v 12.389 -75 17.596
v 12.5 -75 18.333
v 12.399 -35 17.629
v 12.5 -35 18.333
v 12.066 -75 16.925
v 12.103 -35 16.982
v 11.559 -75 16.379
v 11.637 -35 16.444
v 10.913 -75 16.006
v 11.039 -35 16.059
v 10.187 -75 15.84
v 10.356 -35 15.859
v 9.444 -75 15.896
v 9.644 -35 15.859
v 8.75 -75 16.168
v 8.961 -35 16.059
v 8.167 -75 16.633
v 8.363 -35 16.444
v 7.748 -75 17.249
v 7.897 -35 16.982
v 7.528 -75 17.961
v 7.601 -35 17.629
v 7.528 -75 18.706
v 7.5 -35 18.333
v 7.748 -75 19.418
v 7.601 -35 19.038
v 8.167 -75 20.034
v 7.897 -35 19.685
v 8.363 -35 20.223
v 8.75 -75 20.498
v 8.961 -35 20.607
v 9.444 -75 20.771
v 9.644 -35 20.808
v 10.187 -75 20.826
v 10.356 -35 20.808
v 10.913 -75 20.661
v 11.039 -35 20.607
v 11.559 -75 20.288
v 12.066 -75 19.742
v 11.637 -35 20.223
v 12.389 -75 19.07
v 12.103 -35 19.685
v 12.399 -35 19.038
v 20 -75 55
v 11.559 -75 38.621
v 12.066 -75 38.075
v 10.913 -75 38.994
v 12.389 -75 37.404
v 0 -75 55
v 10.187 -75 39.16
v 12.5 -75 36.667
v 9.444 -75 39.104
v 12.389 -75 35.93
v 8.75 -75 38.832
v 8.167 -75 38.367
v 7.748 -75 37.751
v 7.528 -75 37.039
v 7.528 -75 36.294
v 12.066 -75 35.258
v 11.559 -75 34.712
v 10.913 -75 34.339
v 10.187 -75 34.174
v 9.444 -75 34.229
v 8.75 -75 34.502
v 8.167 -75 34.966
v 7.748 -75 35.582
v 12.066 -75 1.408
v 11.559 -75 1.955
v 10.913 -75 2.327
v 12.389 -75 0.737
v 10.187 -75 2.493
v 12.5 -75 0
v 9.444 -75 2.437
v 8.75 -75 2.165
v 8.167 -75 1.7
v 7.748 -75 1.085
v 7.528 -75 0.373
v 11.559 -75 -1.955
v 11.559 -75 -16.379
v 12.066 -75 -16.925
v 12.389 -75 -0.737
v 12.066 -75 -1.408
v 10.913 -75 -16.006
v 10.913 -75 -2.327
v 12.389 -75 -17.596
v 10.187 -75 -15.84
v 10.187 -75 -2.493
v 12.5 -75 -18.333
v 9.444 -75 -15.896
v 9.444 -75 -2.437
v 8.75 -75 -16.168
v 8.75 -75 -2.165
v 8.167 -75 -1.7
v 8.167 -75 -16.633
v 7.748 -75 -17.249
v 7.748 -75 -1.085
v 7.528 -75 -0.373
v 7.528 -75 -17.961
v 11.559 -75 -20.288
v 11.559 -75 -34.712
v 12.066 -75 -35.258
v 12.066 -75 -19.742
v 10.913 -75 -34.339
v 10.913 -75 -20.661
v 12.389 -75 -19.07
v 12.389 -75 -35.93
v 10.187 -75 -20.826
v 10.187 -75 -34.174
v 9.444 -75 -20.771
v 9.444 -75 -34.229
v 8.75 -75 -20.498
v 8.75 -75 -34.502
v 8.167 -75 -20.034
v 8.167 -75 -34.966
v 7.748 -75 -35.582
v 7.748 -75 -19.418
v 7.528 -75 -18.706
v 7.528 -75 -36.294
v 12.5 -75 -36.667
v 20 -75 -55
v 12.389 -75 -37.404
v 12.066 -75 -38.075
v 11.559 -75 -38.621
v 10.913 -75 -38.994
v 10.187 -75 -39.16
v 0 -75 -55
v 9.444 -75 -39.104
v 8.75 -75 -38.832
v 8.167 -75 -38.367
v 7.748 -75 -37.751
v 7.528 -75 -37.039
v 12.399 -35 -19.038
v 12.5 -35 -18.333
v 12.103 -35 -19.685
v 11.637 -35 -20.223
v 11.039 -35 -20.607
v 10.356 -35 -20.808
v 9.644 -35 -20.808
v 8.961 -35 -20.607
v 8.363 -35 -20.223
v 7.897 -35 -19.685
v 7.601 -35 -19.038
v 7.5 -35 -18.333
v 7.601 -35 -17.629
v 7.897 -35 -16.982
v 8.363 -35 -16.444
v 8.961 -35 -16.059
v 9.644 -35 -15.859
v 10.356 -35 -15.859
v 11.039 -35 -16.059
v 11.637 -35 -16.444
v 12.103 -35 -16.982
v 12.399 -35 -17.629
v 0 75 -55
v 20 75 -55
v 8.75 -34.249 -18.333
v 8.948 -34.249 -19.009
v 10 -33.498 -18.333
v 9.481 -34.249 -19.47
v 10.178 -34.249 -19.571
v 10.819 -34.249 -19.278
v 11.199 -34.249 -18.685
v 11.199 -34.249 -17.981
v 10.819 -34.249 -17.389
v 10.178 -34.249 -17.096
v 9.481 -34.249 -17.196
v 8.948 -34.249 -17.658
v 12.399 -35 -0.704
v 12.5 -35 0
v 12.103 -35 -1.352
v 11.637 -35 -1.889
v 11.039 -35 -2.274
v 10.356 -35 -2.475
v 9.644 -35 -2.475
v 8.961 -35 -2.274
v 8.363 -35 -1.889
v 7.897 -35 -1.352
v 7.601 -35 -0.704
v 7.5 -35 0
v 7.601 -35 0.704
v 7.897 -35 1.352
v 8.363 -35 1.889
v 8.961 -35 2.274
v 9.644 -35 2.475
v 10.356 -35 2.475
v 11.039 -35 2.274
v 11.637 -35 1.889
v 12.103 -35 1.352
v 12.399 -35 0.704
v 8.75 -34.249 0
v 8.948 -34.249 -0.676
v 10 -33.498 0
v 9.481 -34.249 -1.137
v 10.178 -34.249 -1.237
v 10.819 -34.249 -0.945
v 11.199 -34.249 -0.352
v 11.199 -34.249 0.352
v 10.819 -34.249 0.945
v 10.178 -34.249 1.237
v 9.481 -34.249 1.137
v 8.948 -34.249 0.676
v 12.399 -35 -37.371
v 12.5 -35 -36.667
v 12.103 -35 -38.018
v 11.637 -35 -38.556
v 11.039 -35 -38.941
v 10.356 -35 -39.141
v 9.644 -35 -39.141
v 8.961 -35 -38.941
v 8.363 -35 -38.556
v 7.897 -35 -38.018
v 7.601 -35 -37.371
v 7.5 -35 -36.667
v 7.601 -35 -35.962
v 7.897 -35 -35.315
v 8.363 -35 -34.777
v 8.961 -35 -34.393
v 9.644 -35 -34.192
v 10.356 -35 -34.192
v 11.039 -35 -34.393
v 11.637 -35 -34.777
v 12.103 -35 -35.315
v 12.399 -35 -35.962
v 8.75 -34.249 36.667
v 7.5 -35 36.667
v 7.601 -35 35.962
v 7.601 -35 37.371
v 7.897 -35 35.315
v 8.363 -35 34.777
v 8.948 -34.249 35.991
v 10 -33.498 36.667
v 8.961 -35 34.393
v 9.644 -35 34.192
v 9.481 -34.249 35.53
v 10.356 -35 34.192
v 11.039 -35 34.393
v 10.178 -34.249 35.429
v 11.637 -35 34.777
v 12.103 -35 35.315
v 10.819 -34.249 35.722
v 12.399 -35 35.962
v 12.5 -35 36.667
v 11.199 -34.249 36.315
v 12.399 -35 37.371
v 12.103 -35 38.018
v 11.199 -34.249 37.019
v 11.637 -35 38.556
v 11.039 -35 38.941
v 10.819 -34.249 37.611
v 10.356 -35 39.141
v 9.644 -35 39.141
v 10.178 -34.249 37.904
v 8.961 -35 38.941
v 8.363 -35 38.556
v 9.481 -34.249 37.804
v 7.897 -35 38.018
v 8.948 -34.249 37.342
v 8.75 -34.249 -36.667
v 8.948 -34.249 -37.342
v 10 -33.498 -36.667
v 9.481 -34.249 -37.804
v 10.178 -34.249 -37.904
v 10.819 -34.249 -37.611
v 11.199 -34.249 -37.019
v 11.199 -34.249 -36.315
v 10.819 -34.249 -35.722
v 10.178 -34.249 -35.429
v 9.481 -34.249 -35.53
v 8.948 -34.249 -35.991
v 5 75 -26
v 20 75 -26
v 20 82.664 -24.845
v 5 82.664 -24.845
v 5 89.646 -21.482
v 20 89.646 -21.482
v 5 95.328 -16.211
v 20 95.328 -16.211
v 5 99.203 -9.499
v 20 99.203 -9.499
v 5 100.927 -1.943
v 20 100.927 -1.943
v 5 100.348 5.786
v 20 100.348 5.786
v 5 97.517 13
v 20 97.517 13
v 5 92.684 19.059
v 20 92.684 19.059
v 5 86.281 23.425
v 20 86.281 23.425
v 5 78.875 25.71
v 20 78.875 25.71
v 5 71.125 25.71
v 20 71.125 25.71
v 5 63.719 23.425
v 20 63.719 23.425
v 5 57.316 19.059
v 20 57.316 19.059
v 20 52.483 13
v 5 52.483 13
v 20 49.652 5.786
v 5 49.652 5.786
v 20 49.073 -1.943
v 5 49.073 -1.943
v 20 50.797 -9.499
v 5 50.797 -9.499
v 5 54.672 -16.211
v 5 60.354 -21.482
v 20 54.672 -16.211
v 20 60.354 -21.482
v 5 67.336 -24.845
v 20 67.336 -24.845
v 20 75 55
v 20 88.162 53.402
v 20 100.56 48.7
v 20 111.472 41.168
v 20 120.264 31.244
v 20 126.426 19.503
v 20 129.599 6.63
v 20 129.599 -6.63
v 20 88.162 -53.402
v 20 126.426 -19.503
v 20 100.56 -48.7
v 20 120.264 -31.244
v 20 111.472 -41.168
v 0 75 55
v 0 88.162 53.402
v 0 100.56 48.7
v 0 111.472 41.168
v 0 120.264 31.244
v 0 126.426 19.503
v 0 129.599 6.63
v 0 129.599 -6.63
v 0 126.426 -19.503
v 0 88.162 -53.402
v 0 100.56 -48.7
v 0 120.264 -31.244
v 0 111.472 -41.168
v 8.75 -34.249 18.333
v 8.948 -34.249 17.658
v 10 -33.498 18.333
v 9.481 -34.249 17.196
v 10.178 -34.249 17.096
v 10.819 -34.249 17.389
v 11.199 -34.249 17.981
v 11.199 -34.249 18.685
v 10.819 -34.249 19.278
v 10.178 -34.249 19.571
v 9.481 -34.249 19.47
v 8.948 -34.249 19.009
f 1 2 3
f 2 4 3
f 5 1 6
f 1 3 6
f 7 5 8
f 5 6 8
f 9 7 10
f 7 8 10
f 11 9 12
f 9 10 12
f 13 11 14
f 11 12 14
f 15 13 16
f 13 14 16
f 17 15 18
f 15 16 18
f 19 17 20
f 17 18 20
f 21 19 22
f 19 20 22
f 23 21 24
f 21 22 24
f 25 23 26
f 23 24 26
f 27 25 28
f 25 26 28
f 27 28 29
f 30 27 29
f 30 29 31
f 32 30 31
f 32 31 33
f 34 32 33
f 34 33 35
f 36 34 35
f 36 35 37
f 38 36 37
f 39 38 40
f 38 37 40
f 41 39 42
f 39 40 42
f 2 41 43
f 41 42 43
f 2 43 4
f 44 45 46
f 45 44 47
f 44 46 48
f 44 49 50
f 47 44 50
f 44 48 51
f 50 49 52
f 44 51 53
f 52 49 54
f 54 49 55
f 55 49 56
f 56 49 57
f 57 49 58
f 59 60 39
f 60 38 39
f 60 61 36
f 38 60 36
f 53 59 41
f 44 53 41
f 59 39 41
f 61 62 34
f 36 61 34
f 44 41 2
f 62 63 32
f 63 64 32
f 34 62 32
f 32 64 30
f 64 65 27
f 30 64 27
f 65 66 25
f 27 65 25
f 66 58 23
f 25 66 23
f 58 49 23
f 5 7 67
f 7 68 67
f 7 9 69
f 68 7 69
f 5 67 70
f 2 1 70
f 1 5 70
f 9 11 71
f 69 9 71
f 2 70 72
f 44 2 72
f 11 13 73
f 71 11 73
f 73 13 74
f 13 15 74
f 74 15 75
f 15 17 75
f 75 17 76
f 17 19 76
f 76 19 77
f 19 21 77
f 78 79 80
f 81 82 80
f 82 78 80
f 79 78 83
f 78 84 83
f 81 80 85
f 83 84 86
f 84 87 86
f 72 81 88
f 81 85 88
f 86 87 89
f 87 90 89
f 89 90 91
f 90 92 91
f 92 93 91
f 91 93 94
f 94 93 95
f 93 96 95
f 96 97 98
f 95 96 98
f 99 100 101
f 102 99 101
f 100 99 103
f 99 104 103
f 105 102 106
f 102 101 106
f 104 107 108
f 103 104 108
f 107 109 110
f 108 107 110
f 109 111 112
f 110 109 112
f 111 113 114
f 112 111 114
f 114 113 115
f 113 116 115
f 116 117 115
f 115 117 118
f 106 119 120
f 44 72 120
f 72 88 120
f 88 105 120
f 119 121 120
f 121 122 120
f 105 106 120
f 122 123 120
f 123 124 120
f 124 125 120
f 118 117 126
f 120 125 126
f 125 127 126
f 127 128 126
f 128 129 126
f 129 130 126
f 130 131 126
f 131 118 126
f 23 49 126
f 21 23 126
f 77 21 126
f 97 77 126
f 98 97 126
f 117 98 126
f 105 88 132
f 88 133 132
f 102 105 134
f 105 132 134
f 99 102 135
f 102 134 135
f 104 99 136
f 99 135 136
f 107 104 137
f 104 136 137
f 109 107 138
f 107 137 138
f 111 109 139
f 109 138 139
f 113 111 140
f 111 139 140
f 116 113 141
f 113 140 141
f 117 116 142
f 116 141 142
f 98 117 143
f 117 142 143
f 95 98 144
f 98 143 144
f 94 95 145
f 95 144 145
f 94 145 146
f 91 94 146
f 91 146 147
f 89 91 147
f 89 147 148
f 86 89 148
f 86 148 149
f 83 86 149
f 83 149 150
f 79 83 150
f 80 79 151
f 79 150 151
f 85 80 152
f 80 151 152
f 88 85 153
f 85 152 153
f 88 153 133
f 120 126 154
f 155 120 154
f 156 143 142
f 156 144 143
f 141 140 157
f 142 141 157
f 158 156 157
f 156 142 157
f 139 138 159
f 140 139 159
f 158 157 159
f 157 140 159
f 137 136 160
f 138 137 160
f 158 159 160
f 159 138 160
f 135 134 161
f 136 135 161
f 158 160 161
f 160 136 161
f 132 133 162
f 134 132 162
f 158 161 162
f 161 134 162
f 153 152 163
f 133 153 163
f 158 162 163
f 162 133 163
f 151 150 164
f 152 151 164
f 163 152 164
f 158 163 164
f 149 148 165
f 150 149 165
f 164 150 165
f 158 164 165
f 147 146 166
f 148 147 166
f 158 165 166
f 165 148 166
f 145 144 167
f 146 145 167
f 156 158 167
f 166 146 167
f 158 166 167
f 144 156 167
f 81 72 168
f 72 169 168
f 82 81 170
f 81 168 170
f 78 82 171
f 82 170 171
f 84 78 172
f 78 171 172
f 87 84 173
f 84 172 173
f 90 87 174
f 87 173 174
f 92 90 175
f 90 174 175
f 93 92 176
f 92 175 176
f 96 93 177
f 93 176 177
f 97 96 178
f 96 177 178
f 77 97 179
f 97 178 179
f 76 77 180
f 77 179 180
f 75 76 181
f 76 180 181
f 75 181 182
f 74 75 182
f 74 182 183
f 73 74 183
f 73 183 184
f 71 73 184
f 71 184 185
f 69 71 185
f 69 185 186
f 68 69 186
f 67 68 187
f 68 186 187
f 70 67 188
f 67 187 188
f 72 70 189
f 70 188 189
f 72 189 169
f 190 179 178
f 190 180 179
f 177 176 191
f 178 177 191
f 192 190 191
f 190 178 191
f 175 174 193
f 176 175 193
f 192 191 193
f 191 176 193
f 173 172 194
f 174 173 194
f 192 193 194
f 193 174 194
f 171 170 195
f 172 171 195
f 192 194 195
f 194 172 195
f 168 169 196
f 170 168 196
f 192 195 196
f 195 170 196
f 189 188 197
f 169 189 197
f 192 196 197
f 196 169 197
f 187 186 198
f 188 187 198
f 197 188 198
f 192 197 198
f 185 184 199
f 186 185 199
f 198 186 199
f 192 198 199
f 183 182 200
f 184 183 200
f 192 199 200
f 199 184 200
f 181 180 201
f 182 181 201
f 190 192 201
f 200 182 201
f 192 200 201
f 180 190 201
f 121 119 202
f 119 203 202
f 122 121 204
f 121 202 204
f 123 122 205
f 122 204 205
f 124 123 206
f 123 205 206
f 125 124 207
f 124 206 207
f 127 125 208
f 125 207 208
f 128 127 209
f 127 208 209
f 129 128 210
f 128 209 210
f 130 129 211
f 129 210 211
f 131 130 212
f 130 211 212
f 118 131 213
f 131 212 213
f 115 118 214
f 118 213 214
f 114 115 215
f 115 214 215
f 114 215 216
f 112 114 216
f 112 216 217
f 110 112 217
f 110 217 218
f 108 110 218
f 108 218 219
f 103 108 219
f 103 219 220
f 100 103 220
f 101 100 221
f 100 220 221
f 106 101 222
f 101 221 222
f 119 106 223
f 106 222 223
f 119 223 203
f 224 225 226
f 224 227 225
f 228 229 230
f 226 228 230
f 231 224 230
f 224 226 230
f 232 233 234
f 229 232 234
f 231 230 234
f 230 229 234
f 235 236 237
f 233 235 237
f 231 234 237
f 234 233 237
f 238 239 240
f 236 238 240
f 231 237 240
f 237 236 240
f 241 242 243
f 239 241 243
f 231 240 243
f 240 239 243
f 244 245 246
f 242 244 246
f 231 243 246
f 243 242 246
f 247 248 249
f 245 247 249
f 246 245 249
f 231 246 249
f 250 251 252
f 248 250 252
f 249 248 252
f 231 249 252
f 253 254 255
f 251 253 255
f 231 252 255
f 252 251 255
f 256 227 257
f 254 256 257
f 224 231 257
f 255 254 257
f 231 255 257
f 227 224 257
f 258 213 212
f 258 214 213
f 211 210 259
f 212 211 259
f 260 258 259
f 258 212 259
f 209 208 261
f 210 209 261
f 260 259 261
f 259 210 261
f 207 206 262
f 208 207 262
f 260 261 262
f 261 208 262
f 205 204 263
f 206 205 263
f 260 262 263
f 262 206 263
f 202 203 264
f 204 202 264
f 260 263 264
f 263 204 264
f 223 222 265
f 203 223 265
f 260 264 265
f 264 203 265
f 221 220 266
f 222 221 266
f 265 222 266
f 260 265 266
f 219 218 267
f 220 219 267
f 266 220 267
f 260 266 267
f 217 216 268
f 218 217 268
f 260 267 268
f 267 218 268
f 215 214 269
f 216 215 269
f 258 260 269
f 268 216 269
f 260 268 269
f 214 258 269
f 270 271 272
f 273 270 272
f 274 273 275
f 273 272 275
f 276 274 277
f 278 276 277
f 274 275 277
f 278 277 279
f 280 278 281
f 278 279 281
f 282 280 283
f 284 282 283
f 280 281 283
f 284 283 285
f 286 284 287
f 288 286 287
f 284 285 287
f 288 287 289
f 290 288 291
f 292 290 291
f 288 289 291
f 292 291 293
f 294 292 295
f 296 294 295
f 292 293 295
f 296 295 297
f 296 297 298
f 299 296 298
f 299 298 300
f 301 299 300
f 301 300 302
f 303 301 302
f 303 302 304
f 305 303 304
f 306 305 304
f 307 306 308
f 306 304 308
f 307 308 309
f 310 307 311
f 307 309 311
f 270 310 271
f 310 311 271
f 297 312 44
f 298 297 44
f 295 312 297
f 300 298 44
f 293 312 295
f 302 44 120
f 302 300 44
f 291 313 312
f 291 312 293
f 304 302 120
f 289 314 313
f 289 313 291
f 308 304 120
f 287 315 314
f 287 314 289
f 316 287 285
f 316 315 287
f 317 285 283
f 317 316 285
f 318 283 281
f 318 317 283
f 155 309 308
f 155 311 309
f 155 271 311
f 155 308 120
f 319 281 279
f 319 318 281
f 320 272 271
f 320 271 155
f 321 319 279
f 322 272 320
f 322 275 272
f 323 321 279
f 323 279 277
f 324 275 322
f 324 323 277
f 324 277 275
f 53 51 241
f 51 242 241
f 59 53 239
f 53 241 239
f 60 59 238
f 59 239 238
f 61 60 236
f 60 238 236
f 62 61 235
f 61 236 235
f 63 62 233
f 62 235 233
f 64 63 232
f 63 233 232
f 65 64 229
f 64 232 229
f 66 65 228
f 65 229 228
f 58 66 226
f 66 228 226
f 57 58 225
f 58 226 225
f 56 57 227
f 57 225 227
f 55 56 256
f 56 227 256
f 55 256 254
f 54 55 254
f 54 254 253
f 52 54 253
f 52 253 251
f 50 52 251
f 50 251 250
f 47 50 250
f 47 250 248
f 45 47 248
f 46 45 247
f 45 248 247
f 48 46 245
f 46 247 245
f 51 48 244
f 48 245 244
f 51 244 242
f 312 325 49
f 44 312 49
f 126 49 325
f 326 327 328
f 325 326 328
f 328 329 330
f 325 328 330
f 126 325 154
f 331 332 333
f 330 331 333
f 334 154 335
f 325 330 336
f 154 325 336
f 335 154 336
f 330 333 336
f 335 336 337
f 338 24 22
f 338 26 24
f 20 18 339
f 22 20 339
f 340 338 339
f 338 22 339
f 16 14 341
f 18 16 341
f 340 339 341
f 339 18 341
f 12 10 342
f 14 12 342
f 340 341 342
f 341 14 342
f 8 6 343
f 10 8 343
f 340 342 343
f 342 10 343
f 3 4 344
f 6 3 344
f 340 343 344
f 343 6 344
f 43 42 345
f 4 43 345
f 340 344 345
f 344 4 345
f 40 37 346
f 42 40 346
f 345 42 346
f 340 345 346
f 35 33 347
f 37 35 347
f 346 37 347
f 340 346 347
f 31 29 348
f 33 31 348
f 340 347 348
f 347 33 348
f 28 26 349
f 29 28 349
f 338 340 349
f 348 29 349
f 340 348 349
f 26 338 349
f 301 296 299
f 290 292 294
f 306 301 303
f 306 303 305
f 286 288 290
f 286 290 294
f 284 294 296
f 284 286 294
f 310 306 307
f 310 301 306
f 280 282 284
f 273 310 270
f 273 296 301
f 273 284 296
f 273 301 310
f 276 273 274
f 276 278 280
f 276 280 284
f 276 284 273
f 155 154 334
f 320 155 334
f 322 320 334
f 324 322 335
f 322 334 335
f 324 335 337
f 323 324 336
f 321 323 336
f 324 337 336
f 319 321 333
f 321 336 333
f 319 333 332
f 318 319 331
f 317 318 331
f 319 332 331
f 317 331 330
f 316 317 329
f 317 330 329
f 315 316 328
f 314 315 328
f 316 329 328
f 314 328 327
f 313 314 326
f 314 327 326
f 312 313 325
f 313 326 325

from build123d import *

# Parameters (mm, degrees)
BOSS_EXTRUDE1_DEPTH             = 20
SKETCH3_R                       = 26
CUT_EXTRUDE1_DEPTH              = 15
TAP_DRILL_FOR_M6X1_0_TAP2_D     = 5
TAP_DRILL_FOR_M6X1_0_TAP2_DEPTH = 40
TAP_DRILL_FOR_M6X1_0_TAP2_TIP   = 1.502151548


with BuildPart() as part:
    # Sketch2 → Boss-Extrude1 (new body)
    with BuildSketch(Plane(origin=(0, 0, 0), x_dir=(0, 0, -1), z_dir=(1, 0, 0))):
        with BuildLine():
            Line((55, -75), (55, 75))
            ThreePointArc((55, 75), (0, 20), (-55, 75))
            Line((-55, 75), (-55, -75))
            Line((-55, -75), (55, -75))
        make_face()
        with BuildLine():
            ThreePointArc((-55, 75), (0, 20), (55, 75))
            Line((55, 75), (-55, 75))
        make_face()
        with BuildLine():
            Line((-55, 75), (55, 75))
            ThreePointArc((55, 75), (0, 130), (-55, 75))
        make_face()
    extrude(amount=BOSS_EXTRUDE1_DEPTH)

    # Sketch3 → Cut-Extrude1 (cut)
    with BuildSketch(Plane(origin=(20, 0, 0), x_dir=(0, 0, -1), z_dir=(1, 0, 0))):
        with Locations((0, 75)):
            Circle(SKETCH3_R)
    extrude(amount=-CUT_EXTRUDE1_DEPTH, mode=Mode.SUBTRACT)

    # Tap Drill for M6x1.0 Tap2
    with Locations(Plane(origin=(0, -75, 0), x_dir=(-1, 0, 0), z_dir=(0, -1, 0))):
        with Locations((-10, -36.666666667), (-10, -18.333333333), (-10, 0), (-10, 18.333333333), (-10, 36.666666667)):
            Hole(TAP_DRILL_FOR_M6X1_0_TAP2_D / 2, depth=TAP_DRILL_FOR_M6X1_0_TAP2_DEPTH)
            with Locations((0, 0, -(TAP_DRILL_FOR_M6X1_0_TAP2_DEPTH + TAP_DRILL_FOR_M6X1_0_TAP2_TIP / 2))):  # 118° drill point
                Cone(0, TAP_DRILL_FOR_M6X1_0_TAP2_D / 2, TAP_DRILL_FOR_M6X1_0_TAP2_TIP, mode=Mode.SUBTRACT)


solid = part.part
